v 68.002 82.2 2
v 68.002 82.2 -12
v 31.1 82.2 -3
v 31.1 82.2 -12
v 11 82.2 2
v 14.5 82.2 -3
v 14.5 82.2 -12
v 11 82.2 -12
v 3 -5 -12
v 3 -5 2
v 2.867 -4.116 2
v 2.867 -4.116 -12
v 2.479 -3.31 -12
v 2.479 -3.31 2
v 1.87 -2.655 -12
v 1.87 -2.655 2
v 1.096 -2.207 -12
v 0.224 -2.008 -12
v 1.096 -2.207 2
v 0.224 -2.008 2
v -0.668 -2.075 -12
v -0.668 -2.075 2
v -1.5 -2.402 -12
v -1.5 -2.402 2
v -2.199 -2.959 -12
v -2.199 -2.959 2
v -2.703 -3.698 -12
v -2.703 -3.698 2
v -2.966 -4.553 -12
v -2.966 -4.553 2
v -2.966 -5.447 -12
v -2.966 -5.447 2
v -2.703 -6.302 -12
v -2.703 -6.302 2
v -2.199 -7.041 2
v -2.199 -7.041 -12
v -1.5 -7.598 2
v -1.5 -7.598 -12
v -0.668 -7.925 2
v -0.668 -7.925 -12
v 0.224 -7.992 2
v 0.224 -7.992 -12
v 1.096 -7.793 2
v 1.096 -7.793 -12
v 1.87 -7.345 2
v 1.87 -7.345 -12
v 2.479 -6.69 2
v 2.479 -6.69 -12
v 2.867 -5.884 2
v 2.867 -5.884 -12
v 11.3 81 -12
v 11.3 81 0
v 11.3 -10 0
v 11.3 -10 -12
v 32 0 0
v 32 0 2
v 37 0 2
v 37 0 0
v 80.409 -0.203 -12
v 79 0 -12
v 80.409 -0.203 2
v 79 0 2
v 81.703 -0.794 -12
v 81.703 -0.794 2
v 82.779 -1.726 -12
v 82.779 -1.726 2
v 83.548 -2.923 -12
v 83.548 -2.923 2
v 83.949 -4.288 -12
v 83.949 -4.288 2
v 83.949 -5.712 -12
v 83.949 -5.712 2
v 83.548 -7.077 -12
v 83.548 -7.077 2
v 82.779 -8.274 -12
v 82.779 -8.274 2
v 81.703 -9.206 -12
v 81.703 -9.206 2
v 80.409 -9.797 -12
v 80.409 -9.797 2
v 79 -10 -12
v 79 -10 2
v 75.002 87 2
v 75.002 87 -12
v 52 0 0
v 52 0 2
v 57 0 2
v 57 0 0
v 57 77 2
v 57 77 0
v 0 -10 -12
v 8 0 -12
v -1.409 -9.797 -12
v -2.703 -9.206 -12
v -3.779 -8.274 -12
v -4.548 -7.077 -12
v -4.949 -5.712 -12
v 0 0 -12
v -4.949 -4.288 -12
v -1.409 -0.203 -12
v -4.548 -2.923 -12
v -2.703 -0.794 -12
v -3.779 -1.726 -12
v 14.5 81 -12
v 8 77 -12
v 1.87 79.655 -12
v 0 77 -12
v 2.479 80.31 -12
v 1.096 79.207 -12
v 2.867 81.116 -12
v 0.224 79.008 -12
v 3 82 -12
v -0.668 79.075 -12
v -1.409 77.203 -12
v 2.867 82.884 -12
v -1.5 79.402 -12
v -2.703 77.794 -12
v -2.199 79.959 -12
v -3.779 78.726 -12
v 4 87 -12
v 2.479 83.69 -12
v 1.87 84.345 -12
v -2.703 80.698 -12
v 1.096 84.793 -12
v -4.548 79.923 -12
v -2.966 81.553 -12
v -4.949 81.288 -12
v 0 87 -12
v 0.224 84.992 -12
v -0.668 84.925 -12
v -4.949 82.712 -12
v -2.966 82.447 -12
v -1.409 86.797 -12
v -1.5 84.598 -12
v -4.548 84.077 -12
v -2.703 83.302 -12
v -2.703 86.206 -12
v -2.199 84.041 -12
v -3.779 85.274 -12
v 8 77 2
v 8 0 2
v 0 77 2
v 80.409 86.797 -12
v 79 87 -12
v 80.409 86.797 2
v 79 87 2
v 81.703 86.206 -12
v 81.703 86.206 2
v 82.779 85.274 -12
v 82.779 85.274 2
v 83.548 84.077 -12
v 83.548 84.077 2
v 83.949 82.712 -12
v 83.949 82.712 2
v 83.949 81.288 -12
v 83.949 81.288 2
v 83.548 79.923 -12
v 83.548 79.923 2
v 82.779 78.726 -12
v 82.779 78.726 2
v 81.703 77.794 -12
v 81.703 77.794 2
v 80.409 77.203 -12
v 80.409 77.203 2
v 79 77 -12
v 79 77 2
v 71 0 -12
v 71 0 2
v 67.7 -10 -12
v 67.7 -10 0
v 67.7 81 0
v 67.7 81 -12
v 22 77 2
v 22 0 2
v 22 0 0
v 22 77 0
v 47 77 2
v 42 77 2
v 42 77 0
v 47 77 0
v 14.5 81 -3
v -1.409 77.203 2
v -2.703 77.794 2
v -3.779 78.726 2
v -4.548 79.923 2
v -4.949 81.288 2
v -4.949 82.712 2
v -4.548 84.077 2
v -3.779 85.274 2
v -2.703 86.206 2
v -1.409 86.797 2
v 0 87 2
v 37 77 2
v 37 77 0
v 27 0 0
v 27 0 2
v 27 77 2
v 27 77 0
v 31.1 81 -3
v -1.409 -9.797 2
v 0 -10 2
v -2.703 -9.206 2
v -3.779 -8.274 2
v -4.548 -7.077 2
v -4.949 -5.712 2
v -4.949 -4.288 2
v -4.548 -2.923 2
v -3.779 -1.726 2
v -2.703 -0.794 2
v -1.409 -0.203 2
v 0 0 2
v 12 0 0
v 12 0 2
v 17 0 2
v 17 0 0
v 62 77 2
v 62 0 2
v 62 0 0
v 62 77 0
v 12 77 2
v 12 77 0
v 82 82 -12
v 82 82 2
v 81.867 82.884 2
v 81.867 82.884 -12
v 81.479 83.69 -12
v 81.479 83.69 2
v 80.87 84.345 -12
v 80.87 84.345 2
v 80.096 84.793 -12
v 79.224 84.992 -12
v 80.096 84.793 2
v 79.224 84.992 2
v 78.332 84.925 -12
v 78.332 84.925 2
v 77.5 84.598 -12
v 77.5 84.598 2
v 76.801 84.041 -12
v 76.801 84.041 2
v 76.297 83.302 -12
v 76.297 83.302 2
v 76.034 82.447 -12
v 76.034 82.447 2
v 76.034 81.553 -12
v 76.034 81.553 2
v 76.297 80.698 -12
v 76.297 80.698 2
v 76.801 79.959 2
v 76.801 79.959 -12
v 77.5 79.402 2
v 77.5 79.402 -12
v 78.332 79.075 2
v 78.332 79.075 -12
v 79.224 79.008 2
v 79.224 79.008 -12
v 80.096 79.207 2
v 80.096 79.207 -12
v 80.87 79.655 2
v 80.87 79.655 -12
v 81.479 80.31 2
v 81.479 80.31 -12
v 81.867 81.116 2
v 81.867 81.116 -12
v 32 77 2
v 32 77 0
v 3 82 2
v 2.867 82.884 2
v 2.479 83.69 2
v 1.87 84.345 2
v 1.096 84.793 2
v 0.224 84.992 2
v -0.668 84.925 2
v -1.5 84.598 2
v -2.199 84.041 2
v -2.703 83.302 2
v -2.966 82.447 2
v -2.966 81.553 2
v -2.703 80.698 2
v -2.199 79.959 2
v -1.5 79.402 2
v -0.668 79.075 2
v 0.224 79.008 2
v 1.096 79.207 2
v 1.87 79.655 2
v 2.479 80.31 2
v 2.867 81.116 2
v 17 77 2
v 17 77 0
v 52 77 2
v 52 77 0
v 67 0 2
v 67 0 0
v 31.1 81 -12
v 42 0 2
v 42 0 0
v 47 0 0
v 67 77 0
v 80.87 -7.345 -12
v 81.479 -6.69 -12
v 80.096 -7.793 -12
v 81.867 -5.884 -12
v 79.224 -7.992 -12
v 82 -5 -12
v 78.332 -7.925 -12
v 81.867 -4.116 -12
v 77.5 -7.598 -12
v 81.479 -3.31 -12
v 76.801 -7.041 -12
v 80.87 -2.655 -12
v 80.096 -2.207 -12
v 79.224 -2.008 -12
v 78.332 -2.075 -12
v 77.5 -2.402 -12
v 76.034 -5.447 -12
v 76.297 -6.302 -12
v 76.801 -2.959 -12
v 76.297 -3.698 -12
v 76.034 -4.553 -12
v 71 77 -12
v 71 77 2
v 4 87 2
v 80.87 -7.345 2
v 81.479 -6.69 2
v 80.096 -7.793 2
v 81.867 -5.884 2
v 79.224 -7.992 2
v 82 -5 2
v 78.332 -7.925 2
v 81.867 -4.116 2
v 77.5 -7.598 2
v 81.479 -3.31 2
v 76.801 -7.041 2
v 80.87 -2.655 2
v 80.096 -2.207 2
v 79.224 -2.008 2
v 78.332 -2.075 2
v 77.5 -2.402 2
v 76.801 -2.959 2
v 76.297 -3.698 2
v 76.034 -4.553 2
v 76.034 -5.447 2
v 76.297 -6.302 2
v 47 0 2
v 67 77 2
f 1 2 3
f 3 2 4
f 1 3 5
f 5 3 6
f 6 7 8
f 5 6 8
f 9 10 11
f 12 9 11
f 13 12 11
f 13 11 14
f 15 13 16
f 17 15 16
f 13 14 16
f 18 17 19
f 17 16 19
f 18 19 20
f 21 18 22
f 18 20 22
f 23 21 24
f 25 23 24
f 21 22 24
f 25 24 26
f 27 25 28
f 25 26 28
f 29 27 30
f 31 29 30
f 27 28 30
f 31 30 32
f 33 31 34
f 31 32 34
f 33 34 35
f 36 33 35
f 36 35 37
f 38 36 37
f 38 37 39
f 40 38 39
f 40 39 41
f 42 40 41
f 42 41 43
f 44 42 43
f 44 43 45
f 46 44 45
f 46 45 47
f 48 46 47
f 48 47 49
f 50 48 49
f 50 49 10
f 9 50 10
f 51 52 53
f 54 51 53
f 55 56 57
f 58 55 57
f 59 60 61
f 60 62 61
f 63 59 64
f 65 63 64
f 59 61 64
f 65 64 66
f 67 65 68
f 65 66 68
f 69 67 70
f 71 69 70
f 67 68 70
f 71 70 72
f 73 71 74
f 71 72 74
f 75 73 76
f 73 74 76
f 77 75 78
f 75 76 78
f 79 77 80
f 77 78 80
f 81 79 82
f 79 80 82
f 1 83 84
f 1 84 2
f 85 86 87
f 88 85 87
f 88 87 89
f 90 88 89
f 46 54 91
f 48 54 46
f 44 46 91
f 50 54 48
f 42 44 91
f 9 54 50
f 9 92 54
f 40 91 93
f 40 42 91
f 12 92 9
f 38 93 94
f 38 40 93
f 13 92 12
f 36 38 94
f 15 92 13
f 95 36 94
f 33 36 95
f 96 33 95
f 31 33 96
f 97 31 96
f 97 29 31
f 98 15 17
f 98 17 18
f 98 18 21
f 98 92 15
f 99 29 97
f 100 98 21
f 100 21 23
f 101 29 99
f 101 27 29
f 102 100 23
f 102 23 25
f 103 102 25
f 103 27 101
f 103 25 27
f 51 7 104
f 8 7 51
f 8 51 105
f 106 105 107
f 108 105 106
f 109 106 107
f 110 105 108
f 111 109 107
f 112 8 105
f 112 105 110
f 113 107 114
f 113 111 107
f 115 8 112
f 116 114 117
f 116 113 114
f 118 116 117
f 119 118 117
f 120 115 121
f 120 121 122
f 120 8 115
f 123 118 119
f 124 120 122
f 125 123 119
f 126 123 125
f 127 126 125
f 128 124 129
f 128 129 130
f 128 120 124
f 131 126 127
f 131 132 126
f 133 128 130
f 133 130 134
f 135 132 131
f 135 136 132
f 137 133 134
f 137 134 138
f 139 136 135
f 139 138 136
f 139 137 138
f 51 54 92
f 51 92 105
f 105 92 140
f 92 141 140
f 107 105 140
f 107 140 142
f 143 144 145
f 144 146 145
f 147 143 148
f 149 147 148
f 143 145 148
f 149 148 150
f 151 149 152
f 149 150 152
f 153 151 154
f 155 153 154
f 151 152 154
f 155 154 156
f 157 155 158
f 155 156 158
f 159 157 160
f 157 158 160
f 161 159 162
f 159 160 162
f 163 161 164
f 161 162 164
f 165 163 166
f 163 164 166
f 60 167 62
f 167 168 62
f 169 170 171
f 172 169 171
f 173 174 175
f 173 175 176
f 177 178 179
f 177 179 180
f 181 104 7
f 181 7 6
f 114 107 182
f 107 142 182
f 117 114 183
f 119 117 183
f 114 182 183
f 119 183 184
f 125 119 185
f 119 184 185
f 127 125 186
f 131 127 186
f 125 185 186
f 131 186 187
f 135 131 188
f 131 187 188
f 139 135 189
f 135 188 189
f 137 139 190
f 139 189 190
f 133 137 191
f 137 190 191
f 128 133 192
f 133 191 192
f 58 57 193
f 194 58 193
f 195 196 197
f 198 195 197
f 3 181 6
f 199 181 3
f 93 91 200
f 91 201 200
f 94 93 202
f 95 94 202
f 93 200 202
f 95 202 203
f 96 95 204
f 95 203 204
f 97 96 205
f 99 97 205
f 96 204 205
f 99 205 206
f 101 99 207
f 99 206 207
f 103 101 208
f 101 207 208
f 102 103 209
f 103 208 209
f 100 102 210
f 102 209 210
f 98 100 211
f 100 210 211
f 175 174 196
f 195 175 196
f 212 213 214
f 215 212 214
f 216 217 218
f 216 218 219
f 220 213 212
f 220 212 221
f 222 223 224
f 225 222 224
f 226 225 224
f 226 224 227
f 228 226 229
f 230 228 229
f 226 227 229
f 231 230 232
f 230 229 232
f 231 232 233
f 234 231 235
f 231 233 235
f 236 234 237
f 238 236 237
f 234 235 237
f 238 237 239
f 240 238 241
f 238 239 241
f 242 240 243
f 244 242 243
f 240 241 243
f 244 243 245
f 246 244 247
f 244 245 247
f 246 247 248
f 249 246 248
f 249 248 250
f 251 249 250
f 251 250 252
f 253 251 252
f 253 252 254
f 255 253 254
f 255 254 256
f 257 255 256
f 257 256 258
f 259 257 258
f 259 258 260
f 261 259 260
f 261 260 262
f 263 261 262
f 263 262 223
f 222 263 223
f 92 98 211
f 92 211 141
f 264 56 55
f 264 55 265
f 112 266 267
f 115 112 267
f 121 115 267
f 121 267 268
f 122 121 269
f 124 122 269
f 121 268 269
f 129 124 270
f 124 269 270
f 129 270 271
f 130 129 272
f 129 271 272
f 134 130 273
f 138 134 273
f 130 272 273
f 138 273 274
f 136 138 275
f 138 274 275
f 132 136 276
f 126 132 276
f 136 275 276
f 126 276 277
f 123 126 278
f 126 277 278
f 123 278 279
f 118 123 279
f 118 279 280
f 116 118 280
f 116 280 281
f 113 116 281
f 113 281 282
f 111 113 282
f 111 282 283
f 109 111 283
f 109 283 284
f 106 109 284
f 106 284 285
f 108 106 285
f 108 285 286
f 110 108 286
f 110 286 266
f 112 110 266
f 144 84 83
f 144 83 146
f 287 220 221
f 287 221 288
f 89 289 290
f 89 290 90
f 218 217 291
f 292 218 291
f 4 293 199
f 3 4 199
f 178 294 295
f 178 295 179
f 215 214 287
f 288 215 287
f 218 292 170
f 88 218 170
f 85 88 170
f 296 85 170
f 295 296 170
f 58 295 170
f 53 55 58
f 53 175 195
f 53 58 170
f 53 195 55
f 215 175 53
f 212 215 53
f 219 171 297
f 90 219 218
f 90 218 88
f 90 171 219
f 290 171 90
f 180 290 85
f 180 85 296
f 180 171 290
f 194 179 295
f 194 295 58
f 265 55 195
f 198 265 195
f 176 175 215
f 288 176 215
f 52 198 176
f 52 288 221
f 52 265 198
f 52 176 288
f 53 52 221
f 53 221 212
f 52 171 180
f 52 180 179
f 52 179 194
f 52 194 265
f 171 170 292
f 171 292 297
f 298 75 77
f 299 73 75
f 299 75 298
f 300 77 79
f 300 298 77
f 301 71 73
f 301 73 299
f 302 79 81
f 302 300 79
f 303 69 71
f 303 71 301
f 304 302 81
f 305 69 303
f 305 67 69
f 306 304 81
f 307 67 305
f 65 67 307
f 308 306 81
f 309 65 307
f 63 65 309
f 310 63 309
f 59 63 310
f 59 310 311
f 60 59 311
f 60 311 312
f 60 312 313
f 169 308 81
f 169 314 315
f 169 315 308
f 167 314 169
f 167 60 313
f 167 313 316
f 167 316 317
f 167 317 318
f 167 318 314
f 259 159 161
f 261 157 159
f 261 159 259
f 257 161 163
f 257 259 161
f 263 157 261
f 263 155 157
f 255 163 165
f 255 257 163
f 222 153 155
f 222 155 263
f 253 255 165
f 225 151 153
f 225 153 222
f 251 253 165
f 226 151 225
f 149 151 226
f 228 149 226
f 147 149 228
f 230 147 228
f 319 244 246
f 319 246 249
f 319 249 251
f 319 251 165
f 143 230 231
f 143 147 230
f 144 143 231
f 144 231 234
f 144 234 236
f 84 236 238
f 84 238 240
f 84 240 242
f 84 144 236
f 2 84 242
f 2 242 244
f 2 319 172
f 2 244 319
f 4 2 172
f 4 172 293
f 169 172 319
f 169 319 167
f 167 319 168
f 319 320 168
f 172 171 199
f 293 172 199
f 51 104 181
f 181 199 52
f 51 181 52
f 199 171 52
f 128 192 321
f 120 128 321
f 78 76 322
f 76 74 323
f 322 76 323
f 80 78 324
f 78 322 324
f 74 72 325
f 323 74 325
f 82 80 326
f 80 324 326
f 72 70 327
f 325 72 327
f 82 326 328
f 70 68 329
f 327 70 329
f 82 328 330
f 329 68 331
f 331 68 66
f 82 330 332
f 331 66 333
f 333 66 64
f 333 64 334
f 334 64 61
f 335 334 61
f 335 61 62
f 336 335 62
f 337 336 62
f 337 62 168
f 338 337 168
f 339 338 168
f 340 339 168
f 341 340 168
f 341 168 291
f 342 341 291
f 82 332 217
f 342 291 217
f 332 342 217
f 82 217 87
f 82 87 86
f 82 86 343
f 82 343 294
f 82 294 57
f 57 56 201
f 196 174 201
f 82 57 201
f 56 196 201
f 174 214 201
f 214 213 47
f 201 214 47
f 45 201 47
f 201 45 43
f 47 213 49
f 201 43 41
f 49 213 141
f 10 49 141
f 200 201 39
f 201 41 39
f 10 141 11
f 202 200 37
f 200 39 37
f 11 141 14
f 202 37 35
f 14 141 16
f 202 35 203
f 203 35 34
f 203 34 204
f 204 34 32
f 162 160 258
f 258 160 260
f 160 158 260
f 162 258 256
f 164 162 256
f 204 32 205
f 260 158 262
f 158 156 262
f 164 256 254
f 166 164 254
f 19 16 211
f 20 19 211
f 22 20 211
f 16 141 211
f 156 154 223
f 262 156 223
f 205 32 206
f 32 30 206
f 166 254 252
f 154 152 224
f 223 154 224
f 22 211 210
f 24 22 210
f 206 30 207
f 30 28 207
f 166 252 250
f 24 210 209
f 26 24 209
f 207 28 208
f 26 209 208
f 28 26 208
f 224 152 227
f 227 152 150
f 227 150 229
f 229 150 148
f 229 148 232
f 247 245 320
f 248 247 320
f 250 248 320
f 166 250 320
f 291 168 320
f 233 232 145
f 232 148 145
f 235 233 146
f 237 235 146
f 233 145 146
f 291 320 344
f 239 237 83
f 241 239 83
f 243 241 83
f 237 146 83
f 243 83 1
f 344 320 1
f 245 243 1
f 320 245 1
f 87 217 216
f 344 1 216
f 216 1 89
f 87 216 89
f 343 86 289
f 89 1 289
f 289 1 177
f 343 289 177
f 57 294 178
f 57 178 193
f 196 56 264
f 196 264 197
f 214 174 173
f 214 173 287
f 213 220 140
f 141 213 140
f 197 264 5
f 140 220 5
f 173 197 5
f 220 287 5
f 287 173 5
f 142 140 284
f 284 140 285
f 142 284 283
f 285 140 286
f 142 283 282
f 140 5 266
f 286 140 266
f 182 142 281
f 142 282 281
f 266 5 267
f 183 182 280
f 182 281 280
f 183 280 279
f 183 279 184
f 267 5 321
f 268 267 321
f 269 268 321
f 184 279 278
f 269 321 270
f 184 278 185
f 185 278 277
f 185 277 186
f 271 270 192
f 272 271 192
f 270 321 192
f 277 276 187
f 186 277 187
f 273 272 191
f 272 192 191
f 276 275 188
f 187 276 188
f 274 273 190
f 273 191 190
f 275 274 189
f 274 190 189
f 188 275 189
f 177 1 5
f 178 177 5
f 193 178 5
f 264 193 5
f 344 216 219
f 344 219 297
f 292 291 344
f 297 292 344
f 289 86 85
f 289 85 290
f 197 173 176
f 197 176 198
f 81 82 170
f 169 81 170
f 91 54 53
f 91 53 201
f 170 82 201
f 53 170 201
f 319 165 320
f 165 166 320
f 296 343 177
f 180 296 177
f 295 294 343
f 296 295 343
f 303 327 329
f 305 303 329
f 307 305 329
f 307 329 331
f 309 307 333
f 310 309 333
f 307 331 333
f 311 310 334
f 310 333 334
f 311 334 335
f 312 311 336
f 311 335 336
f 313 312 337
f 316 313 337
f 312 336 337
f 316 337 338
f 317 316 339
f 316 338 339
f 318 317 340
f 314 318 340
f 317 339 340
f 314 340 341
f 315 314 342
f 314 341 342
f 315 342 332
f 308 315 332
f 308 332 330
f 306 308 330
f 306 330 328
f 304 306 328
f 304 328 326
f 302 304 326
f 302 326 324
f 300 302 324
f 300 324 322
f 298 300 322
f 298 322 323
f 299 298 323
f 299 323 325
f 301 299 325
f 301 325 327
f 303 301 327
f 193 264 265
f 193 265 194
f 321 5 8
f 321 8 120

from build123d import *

# Parameters (mm, degrees)
EXTRUDE_1_DEPTH          = 2
EXTRUDE_2_DEPTH          = 12
SKETCH_5_R               = 3
CUT_EXTRUDE_1_DEPTH      = 15
SKETCH_8_W               = 16.6
SKETCH_8_H               = 9
CUT_EXTRUDE_3_DEPTH      = 7
CUT_EXTRUDE_5_DEPTH      = 1
CUT_EXTRUDE_5_DEPTH_BACK = 15
SKETCH_11_W              = 5
SKETCH_11_H              = 77
CUT_EXTRUDE_6_DEPTH      = 2


with BuildPart() as part:
    # 草图1 → 凸台-拉伸1 (new body)
    with BuildSketch(Plane.XY):
        with BuildLine():
            Line((0, 0), (8, 0))
            Line((8, 0), (8, 77))
            Line((8, 77), (0, 77))
            ThreePointArc((0, 77), (-5, 82), (0, 87))
            Line((0, 87), (79, 87))
            ThreePointArc((79, 87), (84, 82), (79, 77))
            Line((79, 77), (71, 77))
            Line((71, 77), (71, 0))
            Line((71, 0), (79, 0))
            ThreePointArc((79, 0), (84, -5), (79, -10))
            Line((79, -10), (71, -10))
            Line((71, -10), (8, -10))
            Line((8, -10), (0, -10))
            ThreePointArc((0, -10), (-5, -5), (0, 0))
        make_face()
    extrude(amount=EXTRUDE_1_DEPTH)

    # 草图4 → 凸台-拉伸2 (add)
    with BuildSketch(Plane(origin=(0, 0, 0), x_dir=(-1, 0, 0), z_dir=(0, 0, -1))):
        with BuildLine():
            Line((-11.3, 81), (-11.3, -10))
            Line((-11.3, -10), (0, -10))
            ThreePointArc((0, -10), (5, -5), (0, 0))
            Line((0, 0), (-8, 0))
            Line((-8, 0), (-8, 77))
            Line((-8, 77), (0, 77))
            ThreePointArc((0, 77), (5, 82), (0, 87))
            Line((0, 87), (-79, 87))
            ThreePointArc((-79, 87), (-84, 82), (-79, 77))
            Line((-79, 77), (-71, 77))
            Line((-71, 77), (-71, 0))
            Line((-71, 0), (-79, 0))
            ThreePointArc((-79, 0), (-84, -5), (-79, -10))
            Line((-79, -10), (-67.7, -10))
            Line((-67.7, -10), (-67.7, 81))
            Line((-67.7, 81), (-11.3, 81))
        make_face()
    extrude(amount=EXTRUDE_2_DEPTH)

    # 草图5 → 切除-拉伸1 (cut, through all)
    with BuildSketch(Plane.XY.offset(2)):
        with Locations((79, 82)):
            Circle(SKETCH_5_R)
        with Locations((0, 82)):
            Circle(SKETCH_5_R)
        with Locations((79, -5)):
            Circle(SKETCH_5_R)
        with Locations((0, -5)):
            Circle(SKETCH_5_R)
    extrude(amount=-CUT_EXTRUDE_1_DEPTH, mode=Mode.SUBTRACT)

    # 草图8 → 切除-拉伸3 (cut, through all)
    with BuildSketch(Plane.XZ.offset(-81)):
        with Locations((22.8, -7.5)):
            Rectangle(SKETCH_8_W, SKETCH_8_H)
    extrude(amount=-CUT_EXTRUDE_3_DEPTH, mode=Mode.SUBTRACT)

    # 草图10 → 切除-拉伸5 (cut, two sides)
    with BuildSketch(Plane(origin=(0, 0, -12), x_dir=(-1, 0, 0), z_dir=(0, 0, -1))) as cut_extrude_5_sk:
        Polygon((-290.643675891, 234.868702326), (-75.001818332, 87), (-68.001818332, 82.2), (-11, 82.2), (-4, 87), (211.641857559, 234.868702326), (211.641857559, 757.808713643), (-290.643675891, 757.808713643), align=None)
    extrude(amount=CUT_EXTRUDE_5_DEPTH, mode=Mode.SUBTRACT)
    extrude(cut_extrude_5_sk.sketch, amount=-CUT_EXTRUDE_5_DEPTH_BACK, mode=Mode.SUBTRACT)

    # 草图11 → 切除-拉伸6 (cut)
    with BuildSketch(Plane.XY.offset(2)):
        with Locations((14.5, 38.5)):
            Rectangle(SKETCH_11_W, SKETCH_11_H)
        with Locations((24.5, 38.5)):
            Rectangle(SKETCH_11_W, SKETCH_11_H)
        with Locations((34.5, 38.5)):
            Rectangle(SKETCH_11_W, SKETCH_11_H)
        with Locations((44.5, 38.5)):
            Rectangle(SKETCH_11_W, SKETCH_11_H)
        with Locations((54.5, 38.5)):
            Rectangle(SKETCH_11_W, SKETCH_11_H)
        with Locations((64.5, 38.5)):
            Rectangle(SKETCH_11_W, SKETCH_11_H)
    extrude(amount=-CUT_EXTRUDE_6_DEPTH, mode=Mode.SUBTRACT)


solid = part.part
